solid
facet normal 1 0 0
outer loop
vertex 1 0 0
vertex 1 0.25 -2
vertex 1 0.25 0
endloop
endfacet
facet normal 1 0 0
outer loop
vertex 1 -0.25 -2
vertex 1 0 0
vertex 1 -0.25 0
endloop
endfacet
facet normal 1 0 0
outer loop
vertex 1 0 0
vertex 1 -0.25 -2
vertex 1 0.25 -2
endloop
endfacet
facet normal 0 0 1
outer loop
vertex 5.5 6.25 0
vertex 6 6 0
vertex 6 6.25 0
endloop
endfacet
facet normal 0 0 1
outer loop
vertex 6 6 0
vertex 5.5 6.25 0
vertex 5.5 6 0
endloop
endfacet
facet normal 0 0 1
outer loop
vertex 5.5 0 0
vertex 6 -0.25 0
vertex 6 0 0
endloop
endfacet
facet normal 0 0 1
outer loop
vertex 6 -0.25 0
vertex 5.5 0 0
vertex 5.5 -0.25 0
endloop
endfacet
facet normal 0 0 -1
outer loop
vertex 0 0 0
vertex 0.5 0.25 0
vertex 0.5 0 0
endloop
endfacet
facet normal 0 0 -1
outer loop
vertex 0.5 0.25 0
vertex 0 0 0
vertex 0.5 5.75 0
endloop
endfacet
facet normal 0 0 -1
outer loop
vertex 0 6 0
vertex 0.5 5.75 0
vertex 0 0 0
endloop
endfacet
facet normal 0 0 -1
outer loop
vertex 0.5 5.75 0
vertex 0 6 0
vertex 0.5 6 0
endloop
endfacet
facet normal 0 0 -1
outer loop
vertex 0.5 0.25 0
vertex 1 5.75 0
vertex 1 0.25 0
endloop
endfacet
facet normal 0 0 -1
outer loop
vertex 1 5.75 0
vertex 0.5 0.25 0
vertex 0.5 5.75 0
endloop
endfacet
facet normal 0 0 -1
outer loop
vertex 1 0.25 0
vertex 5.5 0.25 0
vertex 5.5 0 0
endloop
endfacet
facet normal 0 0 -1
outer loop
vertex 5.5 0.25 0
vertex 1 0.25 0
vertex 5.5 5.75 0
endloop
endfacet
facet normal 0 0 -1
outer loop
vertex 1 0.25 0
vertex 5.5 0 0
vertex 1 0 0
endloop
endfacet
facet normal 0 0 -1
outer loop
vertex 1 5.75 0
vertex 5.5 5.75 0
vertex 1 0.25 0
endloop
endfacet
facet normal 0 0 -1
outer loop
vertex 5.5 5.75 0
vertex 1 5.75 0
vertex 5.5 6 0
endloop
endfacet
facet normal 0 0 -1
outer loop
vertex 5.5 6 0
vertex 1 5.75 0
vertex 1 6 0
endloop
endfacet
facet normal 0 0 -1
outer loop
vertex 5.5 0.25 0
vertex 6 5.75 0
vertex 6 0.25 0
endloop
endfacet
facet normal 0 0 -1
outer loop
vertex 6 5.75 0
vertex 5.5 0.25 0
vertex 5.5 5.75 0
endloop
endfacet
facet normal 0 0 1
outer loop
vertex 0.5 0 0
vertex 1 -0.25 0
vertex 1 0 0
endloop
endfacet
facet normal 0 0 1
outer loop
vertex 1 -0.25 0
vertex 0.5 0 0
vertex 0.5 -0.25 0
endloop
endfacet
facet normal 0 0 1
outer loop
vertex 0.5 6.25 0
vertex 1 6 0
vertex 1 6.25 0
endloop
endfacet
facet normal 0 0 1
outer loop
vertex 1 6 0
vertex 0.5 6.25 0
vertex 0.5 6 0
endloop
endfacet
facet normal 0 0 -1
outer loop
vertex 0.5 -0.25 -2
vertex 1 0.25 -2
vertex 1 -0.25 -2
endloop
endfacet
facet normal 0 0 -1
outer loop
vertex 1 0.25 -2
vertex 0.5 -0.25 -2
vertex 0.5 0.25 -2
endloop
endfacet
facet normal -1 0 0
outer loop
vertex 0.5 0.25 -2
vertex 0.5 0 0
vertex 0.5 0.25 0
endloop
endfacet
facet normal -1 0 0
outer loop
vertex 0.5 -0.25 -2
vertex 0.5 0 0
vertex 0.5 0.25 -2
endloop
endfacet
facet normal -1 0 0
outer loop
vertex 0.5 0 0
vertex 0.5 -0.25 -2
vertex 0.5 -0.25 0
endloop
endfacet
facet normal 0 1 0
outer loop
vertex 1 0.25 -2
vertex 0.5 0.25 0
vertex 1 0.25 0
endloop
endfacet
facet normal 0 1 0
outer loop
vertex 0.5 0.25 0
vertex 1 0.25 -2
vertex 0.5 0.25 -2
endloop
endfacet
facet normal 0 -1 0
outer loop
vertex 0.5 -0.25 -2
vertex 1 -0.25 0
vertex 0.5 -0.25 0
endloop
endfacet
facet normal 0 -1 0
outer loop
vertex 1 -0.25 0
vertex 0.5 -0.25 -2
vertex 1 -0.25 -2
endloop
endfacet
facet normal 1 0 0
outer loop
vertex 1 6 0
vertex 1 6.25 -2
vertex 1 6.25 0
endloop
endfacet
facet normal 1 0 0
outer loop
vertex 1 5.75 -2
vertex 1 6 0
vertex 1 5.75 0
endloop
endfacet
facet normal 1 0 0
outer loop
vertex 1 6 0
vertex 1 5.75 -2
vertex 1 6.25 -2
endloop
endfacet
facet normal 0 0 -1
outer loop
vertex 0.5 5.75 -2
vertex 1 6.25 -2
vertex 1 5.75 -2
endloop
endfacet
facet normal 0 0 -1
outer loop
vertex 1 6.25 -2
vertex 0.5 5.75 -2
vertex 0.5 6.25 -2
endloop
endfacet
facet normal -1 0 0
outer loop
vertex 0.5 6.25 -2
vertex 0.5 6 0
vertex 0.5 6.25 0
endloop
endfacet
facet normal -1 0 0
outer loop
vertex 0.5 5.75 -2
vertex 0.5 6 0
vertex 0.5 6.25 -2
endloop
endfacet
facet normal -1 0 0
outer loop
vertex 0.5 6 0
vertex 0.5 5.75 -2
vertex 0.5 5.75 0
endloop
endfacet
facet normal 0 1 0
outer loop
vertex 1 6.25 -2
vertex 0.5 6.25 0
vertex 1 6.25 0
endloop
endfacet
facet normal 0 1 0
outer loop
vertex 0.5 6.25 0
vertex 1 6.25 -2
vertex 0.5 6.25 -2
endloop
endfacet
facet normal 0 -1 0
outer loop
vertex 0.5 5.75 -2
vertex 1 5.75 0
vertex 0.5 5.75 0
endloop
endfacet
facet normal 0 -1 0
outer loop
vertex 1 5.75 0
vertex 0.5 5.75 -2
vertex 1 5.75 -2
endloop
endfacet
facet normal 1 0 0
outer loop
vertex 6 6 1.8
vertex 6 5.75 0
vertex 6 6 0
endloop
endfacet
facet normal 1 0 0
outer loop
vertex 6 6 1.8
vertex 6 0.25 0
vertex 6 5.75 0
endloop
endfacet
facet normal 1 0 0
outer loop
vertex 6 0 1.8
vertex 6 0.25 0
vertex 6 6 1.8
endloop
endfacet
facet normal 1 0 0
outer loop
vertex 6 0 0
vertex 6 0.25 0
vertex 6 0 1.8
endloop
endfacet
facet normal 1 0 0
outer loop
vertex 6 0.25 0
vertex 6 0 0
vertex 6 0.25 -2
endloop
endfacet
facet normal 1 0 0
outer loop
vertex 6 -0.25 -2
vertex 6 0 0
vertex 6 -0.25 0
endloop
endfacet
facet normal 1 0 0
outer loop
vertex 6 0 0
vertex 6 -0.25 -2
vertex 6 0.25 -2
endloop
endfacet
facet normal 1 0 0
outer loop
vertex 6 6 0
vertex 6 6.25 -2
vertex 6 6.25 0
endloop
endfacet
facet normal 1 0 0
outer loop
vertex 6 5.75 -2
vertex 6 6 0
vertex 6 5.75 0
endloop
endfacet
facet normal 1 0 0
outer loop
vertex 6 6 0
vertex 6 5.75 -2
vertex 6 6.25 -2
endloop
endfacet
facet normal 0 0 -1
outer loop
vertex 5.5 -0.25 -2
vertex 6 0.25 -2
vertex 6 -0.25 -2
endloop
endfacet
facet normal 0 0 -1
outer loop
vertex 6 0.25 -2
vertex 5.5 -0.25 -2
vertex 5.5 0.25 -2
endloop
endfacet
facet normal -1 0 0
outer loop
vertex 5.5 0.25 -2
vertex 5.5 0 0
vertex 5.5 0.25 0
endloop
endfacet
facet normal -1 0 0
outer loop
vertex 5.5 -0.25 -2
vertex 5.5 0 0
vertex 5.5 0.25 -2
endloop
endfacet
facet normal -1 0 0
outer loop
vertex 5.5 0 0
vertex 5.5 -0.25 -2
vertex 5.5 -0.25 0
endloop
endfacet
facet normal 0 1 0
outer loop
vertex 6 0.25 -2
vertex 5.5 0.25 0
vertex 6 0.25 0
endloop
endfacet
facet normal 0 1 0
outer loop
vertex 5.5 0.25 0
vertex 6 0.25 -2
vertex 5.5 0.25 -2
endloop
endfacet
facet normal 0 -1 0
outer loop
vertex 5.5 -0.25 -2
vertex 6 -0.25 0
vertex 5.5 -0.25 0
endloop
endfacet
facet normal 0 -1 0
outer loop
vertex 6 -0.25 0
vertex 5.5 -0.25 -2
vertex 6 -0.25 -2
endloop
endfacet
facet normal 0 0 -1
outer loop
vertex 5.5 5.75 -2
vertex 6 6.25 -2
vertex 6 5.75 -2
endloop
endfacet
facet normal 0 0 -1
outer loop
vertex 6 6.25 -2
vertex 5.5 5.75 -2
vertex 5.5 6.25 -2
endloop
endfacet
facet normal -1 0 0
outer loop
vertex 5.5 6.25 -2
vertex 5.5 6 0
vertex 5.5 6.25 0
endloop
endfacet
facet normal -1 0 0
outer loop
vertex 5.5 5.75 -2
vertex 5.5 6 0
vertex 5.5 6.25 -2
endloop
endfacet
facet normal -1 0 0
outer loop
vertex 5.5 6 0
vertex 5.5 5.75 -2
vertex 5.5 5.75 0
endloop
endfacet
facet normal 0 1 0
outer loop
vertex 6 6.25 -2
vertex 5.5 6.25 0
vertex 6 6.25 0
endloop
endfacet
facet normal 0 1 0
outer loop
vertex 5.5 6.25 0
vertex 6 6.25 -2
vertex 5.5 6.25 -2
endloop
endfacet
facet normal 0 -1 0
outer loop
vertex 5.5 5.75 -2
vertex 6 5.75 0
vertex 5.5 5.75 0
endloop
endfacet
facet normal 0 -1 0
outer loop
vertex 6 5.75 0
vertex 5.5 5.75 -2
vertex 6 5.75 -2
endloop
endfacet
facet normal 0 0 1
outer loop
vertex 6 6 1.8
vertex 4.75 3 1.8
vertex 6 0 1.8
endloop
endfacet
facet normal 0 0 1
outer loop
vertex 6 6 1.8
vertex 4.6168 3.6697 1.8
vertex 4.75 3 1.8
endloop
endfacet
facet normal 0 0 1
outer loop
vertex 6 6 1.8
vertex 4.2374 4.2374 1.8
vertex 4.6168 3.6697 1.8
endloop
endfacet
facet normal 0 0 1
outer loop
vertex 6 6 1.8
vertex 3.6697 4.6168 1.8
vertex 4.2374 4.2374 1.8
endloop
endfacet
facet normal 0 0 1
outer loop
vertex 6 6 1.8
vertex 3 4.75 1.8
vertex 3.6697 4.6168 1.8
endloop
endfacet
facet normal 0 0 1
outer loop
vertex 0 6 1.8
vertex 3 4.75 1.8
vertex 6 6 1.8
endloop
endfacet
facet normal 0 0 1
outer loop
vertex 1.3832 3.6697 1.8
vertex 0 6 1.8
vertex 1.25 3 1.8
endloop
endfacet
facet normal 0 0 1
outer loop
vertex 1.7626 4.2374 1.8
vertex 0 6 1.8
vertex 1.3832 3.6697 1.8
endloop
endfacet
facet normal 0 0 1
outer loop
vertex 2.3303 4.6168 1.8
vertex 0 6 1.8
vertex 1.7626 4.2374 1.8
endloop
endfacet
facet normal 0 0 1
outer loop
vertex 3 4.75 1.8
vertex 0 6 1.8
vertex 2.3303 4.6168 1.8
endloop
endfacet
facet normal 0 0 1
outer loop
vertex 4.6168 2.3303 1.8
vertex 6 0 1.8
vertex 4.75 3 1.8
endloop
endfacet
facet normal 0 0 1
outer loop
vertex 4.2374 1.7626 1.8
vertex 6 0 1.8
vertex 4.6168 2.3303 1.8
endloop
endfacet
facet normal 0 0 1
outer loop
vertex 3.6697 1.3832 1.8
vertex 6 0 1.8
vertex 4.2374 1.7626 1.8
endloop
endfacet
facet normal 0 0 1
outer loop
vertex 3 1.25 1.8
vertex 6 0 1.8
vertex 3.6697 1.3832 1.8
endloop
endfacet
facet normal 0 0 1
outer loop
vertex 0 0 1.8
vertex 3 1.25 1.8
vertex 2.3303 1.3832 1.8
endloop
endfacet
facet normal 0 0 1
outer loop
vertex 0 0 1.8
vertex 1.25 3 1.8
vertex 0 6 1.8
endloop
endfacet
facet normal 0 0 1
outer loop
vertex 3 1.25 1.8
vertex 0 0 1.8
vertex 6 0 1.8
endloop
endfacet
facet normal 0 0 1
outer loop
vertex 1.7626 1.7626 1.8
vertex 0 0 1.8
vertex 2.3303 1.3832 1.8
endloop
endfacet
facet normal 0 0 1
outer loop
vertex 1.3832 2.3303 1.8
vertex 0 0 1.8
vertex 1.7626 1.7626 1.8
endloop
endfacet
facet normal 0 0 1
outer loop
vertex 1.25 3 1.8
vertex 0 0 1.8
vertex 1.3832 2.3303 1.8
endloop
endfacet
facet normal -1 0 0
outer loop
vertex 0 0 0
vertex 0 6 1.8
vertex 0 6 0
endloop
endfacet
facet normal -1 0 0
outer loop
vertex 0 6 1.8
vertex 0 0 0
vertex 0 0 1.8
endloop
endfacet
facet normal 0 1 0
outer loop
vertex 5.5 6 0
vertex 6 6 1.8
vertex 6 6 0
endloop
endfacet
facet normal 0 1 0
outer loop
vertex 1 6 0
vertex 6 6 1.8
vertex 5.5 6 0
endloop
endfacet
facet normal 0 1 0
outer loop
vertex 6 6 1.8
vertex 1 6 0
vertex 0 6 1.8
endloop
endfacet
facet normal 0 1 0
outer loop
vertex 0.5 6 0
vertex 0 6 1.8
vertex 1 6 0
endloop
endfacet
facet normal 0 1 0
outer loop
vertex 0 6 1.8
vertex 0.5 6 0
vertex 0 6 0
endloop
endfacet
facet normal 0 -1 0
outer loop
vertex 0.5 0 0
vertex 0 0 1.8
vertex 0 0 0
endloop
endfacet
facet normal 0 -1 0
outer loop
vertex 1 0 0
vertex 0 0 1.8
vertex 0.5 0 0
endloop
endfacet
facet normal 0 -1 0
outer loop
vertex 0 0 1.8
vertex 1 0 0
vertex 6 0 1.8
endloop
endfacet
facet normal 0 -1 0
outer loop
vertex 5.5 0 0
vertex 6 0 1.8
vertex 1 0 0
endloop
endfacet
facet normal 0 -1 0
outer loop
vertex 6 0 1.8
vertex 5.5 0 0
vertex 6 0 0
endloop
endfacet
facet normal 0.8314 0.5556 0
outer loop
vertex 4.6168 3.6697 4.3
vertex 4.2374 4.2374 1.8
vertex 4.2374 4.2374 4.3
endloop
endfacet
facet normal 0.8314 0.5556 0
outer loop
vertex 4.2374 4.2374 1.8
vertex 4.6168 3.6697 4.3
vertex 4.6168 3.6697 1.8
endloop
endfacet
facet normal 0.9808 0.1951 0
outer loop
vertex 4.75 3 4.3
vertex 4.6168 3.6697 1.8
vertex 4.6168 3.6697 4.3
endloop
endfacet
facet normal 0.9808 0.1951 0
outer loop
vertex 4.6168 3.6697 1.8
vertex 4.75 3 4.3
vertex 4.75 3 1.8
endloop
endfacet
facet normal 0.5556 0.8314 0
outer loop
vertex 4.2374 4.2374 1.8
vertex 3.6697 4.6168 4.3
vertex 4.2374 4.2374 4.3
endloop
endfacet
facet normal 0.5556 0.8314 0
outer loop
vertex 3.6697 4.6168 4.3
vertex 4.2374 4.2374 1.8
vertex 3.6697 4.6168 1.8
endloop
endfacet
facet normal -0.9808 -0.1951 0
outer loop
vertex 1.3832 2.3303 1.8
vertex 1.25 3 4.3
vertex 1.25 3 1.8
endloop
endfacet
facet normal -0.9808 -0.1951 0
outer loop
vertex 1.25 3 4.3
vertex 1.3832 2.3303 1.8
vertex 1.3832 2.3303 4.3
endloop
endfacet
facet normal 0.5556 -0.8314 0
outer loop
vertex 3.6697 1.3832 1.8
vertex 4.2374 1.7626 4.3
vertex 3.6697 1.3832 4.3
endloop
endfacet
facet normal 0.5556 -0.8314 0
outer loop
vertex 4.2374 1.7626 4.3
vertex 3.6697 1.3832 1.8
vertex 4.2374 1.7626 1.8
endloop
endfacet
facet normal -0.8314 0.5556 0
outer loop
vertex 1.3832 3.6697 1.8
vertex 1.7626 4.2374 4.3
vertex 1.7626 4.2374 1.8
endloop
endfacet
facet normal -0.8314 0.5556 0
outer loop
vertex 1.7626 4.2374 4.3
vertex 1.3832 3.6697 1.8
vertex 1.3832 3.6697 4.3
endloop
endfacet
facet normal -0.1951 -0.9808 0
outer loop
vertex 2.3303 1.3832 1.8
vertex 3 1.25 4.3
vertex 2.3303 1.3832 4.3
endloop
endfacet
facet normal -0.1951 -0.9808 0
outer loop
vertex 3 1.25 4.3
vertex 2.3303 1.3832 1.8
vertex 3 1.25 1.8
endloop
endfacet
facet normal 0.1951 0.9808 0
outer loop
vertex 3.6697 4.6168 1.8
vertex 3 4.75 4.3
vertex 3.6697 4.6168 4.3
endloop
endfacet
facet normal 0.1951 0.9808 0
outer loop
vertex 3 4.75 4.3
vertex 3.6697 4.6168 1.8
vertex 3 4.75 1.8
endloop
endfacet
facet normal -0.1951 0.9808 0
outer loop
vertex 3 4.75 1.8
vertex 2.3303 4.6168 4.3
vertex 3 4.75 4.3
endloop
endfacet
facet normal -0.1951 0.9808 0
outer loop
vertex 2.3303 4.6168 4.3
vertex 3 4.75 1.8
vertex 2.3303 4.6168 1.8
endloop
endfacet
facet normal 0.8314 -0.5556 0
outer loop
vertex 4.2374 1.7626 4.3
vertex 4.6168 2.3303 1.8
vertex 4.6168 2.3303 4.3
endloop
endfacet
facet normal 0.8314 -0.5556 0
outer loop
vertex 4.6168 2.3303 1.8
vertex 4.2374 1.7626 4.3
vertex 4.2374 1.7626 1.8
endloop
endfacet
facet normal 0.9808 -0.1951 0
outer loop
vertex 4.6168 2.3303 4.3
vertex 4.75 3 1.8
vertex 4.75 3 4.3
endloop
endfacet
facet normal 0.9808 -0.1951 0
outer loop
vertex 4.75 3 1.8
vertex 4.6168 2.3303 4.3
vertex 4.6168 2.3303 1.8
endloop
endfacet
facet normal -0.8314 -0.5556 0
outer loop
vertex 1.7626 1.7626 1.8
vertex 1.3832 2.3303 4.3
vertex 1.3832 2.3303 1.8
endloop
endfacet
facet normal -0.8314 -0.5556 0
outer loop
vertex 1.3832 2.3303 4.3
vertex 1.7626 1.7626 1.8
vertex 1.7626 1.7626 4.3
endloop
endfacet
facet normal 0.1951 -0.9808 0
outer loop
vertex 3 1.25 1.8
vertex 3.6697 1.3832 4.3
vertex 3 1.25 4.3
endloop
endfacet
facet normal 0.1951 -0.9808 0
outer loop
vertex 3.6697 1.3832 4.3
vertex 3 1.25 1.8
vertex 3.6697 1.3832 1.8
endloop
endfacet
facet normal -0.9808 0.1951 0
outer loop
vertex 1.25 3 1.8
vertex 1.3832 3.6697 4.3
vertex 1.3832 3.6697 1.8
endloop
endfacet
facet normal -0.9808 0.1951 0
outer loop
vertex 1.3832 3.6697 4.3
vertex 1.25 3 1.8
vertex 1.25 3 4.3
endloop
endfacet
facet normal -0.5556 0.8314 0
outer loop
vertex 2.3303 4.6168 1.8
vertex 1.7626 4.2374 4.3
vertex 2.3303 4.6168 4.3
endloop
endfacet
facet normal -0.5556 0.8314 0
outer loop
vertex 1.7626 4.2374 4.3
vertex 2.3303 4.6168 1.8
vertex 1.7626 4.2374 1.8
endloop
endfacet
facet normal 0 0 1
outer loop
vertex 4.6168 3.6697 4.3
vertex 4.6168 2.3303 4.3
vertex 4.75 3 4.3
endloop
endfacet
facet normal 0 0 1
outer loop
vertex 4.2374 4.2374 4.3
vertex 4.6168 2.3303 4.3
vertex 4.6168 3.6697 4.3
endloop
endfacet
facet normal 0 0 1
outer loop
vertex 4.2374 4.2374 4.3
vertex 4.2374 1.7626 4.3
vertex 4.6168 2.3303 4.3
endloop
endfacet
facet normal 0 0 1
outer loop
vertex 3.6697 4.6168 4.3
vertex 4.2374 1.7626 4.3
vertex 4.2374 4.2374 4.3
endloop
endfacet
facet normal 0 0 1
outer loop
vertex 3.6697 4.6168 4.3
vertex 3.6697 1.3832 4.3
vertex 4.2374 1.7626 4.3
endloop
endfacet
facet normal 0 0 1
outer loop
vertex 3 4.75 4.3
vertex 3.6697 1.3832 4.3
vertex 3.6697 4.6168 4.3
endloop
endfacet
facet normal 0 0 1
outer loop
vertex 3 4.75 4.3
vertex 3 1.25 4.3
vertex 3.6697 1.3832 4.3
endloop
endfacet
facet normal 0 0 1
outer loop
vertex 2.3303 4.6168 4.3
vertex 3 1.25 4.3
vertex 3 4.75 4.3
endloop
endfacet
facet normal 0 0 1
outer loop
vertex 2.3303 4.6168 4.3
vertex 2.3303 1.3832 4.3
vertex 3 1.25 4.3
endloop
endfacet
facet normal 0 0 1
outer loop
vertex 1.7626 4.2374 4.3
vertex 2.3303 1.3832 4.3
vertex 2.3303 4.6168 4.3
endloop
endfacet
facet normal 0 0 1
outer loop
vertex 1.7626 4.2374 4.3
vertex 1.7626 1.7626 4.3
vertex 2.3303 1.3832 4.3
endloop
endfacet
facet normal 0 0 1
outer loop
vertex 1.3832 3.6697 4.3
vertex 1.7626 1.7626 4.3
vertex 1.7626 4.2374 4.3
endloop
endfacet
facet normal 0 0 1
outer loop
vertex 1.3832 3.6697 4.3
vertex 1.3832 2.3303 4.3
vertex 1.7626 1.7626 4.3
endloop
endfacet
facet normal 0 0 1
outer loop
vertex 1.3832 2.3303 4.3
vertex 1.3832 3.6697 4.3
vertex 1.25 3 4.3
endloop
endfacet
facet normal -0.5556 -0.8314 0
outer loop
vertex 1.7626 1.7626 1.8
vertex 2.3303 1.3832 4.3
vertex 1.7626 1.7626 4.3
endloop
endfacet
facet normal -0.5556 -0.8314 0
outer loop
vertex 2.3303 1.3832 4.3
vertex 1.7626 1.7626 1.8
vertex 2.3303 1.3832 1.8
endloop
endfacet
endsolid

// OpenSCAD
// =============================================================================
// 6x6mm Tactile Switch - Reference Model
// For fitment verification only - not for printing
// =============================================================================

// Include parameters (safe to include multiple times)
include <../parameters.scad>

module tact_switch_6x6() {
    // Base body
    color([0.1, 0.1, 0.1])
    cube([tact_switch_size, tact_switch_size, tact_switch_height - tact_switch_button_height]);

    // Clickable button on top
    color([0.9, 0.9, 0.85])
    translate([tact_switch_size/2, tact_switch_size/2, tact_switch_height - tact_switch_button_height])
        cylinder(h=tact_switch_button_height, d=3.5, $fn=16);

    // Legs (simplified)
    color([0.8, 0.8, 0.8])
    for (x = [0.5, tact_switch_size - 0.5])
        for (y = [0, tact_switch_size]) {
            translate([x, y - 0.25, -2])
                cube([0.5, 0.5, 2]);
        }
}

// Preview (renders when opening this file directly)
tact_switch_6x6();
